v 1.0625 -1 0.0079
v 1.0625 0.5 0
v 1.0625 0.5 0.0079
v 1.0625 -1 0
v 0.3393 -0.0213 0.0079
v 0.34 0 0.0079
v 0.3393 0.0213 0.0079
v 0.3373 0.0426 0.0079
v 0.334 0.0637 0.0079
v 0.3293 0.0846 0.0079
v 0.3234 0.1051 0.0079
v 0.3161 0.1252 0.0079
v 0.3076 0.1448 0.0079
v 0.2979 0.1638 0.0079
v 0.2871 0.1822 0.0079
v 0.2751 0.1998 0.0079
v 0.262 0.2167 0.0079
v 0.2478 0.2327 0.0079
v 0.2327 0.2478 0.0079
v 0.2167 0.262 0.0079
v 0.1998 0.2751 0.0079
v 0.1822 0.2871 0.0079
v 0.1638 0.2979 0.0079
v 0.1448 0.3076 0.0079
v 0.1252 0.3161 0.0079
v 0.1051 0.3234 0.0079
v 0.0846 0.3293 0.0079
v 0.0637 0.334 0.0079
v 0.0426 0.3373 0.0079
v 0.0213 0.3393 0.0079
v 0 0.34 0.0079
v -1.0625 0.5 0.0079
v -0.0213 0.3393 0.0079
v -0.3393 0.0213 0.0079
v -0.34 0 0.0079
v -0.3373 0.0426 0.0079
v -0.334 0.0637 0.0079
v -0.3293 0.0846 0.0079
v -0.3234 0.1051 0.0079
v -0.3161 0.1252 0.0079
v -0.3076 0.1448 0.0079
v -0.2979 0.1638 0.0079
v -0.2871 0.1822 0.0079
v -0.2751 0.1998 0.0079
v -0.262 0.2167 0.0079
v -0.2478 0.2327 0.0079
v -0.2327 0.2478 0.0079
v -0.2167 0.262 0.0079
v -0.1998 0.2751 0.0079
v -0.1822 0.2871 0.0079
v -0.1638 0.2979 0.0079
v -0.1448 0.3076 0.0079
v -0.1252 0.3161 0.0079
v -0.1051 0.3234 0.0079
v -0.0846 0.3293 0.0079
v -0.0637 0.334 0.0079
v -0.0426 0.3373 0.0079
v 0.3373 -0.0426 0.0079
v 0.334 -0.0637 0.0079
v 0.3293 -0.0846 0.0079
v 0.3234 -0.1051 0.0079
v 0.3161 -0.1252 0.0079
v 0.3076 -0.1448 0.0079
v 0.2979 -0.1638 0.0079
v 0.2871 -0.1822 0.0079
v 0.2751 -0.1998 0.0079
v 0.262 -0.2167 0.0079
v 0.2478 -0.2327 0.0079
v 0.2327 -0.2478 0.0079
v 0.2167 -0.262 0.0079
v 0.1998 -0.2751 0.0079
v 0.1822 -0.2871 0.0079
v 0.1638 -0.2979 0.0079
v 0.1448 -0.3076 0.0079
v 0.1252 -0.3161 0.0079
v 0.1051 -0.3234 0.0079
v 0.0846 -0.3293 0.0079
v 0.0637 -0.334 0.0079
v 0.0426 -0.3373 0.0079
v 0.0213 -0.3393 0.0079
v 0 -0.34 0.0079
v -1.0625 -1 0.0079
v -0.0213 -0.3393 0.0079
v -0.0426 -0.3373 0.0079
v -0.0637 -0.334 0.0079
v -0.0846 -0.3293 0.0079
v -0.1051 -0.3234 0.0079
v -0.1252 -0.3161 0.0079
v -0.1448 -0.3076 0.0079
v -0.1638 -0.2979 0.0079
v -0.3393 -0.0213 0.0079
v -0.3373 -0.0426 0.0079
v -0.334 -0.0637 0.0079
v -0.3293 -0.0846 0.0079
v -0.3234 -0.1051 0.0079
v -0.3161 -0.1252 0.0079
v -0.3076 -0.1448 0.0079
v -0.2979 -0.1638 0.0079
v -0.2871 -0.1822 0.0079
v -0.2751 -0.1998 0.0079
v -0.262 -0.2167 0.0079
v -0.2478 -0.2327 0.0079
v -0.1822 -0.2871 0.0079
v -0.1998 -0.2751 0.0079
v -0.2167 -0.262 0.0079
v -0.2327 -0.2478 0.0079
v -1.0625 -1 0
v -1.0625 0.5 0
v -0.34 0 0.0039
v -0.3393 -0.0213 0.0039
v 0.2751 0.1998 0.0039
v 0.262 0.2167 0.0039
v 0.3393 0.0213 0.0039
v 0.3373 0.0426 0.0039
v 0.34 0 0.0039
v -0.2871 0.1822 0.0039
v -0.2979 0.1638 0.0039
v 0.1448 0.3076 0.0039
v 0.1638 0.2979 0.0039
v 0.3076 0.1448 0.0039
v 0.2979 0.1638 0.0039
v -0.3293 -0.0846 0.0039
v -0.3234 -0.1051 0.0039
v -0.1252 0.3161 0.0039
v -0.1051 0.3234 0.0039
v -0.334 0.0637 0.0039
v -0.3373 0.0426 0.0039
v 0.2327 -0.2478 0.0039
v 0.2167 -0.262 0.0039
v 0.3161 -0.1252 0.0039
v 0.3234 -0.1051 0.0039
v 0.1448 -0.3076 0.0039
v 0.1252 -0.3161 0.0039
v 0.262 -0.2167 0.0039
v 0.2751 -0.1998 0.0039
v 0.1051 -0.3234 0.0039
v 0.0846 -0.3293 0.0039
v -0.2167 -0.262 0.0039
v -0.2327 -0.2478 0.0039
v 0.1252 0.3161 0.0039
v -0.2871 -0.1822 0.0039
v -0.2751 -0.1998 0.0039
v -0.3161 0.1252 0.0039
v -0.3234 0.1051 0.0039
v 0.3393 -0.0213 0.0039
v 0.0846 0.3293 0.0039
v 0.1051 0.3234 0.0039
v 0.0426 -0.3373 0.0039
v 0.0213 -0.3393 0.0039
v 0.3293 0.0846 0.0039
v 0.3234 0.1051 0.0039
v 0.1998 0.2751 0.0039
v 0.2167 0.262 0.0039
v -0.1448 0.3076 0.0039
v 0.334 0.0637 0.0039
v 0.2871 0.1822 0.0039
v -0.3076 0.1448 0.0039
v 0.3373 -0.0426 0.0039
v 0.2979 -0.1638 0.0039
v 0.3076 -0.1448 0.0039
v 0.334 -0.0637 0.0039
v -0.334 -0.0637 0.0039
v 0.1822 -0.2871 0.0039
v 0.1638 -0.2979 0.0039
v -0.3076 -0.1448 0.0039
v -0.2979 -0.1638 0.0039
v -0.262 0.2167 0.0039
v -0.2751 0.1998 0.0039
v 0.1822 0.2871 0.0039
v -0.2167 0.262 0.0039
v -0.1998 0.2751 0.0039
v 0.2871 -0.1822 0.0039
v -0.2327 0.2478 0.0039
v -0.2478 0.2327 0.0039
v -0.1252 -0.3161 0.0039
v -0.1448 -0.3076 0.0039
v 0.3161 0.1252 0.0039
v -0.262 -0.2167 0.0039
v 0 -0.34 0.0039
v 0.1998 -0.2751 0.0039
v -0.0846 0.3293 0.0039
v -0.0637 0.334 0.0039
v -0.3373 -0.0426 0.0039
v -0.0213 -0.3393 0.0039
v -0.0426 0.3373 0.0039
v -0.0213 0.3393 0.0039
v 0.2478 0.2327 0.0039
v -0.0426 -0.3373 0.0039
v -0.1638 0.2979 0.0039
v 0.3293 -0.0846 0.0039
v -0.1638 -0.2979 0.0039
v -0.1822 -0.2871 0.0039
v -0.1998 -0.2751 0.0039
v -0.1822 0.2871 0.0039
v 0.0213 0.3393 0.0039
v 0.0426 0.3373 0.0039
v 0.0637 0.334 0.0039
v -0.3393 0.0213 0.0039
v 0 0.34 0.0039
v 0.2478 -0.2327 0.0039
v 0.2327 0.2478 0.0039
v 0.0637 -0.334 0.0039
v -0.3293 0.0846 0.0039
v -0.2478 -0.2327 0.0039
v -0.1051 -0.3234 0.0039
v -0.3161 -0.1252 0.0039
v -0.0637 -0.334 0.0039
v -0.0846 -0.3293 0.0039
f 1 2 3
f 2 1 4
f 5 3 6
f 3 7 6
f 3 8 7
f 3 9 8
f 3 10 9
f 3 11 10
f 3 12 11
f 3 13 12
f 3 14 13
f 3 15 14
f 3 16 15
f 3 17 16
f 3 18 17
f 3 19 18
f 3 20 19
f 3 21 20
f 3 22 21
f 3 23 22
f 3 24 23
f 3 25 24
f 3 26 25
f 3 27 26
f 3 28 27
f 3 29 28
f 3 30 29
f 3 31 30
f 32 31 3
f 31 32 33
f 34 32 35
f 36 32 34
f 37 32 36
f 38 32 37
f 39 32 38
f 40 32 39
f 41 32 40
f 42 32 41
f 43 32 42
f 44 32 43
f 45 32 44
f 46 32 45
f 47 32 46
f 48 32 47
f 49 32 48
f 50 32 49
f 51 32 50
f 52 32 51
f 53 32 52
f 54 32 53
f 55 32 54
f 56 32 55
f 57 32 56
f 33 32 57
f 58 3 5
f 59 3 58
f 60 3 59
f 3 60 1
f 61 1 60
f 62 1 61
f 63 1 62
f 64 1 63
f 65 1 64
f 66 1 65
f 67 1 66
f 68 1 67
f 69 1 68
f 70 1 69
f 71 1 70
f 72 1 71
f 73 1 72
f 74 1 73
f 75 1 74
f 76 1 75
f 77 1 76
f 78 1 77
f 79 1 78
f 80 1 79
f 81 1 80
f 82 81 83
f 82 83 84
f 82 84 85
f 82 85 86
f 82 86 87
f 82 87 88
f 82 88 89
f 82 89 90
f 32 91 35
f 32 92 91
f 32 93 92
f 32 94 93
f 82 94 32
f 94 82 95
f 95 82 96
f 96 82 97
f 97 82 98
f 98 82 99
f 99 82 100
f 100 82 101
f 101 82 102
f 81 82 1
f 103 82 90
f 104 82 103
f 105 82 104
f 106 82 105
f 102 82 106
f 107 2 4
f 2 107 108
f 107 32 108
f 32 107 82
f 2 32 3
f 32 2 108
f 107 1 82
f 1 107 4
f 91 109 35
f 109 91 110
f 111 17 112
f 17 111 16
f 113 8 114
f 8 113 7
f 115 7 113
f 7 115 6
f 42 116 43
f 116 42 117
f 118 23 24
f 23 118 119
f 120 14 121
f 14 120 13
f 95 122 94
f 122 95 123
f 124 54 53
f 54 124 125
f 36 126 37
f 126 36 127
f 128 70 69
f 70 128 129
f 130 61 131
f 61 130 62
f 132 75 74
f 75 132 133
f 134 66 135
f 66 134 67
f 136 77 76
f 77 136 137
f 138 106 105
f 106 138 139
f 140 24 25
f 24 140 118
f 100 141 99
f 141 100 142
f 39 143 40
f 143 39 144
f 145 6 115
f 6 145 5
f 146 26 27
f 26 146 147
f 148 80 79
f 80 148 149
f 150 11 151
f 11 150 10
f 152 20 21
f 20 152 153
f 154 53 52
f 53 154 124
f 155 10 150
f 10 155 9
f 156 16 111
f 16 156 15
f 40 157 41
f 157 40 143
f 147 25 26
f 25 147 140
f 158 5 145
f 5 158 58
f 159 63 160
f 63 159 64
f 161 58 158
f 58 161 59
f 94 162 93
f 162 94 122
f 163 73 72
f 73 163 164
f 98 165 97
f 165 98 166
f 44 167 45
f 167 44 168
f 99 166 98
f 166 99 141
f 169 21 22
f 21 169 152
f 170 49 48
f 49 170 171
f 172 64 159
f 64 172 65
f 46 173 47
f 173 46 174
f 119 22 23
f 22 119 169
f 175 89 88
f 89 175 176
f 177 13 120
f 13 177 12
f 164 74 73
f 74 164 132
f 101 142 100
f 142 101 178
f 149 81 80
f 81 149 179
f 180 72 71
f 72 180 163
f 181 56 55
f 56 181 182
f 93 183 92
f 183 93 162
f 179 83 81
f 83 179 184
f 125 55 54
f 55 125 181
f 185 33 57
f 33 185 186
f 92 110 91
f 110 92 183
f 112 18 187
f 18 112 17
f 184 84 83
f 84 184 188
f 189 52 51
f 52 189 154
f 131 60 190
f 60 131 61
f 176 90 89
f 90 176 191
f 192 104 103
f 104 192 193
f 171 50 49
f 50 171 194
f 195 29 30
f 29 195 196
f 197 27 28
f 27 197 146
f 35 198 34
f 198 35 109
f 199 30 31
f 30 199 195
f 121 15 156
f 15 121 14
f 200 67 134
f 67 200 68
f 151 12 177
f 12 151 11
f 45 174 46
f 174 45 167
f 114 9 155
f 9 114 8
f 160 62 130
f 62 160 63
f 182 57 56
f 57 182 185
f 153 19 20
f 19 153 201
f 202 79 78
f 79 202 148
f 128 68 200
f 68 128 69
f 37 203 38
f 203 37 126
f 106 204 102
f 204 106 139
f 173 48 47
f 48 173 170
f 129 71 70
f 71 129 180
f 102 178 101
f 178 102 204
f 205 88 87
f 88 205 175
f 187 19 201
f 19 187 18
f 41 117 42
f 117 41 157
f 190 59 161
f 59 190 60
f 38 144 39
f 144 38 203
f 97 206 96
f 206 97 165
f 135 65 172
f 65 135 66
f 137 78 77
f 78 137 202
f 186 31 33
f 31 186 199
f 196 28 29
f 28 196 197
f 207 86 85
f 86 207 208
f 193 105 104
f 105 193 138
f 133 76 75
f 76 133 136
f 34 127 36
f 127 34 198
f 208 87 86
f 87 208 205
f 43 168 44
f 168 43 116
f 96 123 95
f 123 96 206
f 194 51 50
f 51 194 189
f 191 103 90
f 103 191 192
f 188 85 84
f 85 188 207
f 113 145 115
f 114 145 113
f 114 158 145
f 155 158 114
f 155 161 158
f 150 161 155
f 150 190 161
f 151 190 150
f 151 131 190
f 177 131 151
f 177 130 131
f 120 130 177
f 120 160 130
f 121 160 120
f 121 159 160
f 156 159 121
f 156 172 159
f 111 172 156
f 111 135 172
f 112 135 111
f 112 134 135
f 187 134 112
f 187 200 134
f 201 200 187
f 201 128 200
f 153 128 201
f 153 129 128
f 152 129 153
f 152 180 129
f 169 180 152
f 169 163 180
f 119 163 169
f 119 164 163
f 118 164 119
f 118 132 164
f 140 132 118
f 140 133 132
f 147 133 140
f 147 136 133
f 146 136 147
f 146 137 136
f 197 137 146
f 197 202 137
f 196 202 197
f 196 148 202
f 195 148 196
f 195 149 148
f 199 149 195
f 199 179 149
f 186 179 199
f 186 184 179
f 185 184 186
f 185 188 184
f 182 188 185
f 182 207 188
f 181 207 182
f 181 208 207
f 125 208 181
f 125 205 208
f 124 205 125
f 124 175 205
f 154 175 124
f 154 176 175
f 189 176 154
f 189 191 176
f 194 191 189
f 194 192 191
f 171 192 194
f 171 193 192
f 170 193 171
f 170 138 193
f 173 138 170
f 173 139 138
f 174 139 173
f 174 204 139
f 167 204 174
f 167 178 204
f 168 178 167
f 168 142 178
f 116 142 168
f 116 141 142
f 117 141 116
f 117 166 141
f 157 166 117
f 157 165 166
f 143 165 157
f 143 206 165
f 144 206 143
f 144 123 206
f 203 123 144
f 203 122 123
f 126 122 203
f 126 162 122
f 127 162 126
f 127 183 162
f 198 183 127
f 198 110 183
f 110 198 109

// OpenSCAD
model_file = "";
expansion_ring = "";
label_text = "";

mm_to_in = 0.03937805;
layer_height = .2 * mm_to_in;

text_size = 0.35;
text_height = layer_height * 3;
text_x = 0;
text_y = -.75;

module label() {
    union() {
        // label text
        translate([text_x, text_y, layer_height/2])
            linear_extrude(height = text_height)
                text(
                    label_text,
                    size = text_size,
                    halign = "center",
                    valign = "center"
                );
        
        // brim
        difference() {
            translate([0, -0.25, 1 * layer_height/2])
                cube([2.125, 1.5, layer_height], center = true);
            translate([0, 0, layer_height])
                cylinder(h = layer_height, r = 0.34, $fn = 100, center = true);
        }
    }
}

difference() {
    union() {
        import(model_file, convexity=10);
        label();
    }
    
    import(expansion_ring, convexity=10);
}
